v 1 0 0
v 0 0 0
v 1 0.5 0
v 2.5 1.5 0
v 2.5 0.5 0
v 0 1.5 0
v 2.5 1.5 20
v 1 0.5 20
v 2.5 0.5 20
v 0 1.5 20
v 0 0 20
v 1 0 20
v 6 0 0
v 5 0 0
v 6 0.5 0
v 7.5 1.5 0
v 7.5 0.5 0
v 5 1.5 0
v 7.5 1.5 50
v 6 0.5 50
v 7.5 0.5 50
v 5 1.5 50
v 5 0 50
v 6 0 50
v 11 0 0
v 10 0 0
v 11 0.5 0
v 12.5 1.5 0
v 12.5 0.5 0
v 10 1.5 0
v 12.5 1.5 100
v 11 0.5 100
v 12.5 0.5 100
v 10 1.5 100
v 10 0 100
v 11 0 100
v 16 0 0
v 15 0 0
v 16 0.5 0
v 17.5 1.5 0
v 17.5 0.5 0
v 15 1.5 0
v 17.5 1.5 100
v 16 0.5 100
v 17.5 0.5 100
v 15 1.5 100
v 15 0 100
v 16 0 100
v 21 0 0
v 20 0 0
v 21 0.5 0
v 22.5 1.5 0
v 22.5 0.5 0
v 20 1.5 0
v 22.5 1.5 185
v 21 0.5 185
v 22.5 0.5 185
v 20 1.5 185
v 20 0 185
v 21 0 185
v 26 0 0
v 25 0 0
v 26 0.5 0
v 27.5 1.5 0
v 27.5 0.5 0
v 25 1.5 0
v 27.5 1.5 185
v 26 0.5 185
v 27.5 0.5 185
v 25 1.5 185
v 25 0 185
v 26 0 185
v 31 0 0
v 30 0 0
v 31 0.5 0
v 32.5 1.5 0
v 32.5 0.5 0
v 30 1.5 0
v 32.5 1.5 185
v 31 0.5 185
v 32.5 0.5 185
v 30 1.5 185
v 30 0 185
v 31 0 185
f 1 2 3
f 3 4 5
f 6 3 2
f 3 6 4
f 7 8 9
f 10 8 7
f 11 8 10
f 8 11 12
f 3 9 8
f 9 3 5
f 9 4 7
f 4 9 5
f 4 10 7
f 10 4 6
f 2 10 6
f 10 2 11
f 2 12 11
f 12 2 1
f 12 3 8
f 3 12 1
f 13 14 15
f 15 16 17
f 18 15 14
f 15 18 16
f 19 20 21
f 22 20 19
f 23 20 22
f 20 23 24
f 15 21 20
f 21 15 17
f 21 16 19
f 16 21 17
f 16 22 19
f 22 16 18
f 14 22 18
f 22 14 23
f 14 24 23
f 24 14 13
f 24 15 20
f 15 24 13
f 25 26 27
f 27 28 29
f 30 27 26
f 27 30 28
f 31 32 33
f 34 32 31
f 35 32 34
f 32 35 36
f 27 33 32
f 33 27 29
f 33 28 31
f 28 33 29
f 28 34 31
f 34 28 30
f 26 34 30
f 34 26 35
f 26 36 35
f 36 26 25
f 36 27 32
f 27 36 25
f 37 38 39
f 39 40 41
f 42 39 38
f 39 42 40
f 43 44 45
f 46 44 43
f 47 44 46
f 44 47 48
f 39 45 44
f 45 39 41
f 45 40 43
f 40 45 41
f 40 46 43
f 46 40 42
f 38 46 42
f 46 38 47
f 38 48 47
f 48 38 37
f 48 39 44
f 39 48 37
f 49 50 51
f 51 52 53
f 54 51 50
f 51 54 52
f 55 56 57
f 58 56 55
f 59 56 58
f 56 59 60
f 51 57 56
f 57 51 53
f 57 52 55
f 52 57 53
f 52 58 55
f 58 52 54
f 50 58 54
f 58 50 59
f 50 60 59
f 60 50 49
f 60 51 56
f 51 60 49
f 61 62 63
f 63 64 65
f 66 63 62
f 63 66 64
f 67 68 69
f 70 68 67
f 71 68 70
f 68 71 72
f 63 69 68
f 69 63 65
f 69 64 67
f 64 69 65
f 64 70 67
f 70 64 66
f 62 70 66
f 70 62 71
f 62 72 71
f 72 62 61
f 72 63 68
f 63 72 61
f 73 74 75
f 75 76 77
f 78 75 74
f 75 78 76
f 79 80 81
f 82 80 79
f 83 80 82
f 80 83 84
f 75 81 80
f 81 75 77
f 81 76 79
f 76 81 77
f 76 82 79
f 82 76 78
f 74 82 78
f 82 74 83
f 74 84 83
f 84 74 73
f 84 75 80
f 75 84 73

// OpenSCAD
// created by IndiePandaaaaa | Lukas

with_ramp = false;
ramp_depth = 40;
ramp_height_material_thickness = 3;
ramp_height_difference = 15;
ramp_width = 65;

lprofile_length = 42;
lprofile_height = 1.5;
lprofile_width = 2.5;
lprofile_thickness = 1;

module LProfile(length, width, height, thickness) {
  if (length != undef) {
    linear_extrude(length) {
      polygon([
          [0, 0],
          [thickness, 0],
          [thickness, height - thickness],
          [width, height - thickness],
          [width, height],
          [0, height],
        ]);
    }
  }
}

// ramp adapter
if (with_ramp) {
  linear_extrude(ramp_depth) {
    polygon([
        [0, ramp_height_difference + ramp_height_material_thickness],
        [ramp_width, ramp_height_material_thickness],
        [ramp_width, 0],
      ]);
  }
}

bed_width = 200;
xPos = with_ramp ? ramp_width + 5 : 0;
translate([xPos, 0, 0]) {
  // lengths = [130, 200, 156, 157, 157]; // 470 splitted into 156,157,157
  lengths = [20, 50, 100, 100, 185, 185, 185]; // 555 splitted into 185 x3
  for (i = [0:len(lengths) - 1]) {
    echo(lengths[i]);
    translate([5 * i, 0, 0]) LProfile(lengths[i], lprofile_width, lprofile_height, lprofile_thickness);
  }
}
